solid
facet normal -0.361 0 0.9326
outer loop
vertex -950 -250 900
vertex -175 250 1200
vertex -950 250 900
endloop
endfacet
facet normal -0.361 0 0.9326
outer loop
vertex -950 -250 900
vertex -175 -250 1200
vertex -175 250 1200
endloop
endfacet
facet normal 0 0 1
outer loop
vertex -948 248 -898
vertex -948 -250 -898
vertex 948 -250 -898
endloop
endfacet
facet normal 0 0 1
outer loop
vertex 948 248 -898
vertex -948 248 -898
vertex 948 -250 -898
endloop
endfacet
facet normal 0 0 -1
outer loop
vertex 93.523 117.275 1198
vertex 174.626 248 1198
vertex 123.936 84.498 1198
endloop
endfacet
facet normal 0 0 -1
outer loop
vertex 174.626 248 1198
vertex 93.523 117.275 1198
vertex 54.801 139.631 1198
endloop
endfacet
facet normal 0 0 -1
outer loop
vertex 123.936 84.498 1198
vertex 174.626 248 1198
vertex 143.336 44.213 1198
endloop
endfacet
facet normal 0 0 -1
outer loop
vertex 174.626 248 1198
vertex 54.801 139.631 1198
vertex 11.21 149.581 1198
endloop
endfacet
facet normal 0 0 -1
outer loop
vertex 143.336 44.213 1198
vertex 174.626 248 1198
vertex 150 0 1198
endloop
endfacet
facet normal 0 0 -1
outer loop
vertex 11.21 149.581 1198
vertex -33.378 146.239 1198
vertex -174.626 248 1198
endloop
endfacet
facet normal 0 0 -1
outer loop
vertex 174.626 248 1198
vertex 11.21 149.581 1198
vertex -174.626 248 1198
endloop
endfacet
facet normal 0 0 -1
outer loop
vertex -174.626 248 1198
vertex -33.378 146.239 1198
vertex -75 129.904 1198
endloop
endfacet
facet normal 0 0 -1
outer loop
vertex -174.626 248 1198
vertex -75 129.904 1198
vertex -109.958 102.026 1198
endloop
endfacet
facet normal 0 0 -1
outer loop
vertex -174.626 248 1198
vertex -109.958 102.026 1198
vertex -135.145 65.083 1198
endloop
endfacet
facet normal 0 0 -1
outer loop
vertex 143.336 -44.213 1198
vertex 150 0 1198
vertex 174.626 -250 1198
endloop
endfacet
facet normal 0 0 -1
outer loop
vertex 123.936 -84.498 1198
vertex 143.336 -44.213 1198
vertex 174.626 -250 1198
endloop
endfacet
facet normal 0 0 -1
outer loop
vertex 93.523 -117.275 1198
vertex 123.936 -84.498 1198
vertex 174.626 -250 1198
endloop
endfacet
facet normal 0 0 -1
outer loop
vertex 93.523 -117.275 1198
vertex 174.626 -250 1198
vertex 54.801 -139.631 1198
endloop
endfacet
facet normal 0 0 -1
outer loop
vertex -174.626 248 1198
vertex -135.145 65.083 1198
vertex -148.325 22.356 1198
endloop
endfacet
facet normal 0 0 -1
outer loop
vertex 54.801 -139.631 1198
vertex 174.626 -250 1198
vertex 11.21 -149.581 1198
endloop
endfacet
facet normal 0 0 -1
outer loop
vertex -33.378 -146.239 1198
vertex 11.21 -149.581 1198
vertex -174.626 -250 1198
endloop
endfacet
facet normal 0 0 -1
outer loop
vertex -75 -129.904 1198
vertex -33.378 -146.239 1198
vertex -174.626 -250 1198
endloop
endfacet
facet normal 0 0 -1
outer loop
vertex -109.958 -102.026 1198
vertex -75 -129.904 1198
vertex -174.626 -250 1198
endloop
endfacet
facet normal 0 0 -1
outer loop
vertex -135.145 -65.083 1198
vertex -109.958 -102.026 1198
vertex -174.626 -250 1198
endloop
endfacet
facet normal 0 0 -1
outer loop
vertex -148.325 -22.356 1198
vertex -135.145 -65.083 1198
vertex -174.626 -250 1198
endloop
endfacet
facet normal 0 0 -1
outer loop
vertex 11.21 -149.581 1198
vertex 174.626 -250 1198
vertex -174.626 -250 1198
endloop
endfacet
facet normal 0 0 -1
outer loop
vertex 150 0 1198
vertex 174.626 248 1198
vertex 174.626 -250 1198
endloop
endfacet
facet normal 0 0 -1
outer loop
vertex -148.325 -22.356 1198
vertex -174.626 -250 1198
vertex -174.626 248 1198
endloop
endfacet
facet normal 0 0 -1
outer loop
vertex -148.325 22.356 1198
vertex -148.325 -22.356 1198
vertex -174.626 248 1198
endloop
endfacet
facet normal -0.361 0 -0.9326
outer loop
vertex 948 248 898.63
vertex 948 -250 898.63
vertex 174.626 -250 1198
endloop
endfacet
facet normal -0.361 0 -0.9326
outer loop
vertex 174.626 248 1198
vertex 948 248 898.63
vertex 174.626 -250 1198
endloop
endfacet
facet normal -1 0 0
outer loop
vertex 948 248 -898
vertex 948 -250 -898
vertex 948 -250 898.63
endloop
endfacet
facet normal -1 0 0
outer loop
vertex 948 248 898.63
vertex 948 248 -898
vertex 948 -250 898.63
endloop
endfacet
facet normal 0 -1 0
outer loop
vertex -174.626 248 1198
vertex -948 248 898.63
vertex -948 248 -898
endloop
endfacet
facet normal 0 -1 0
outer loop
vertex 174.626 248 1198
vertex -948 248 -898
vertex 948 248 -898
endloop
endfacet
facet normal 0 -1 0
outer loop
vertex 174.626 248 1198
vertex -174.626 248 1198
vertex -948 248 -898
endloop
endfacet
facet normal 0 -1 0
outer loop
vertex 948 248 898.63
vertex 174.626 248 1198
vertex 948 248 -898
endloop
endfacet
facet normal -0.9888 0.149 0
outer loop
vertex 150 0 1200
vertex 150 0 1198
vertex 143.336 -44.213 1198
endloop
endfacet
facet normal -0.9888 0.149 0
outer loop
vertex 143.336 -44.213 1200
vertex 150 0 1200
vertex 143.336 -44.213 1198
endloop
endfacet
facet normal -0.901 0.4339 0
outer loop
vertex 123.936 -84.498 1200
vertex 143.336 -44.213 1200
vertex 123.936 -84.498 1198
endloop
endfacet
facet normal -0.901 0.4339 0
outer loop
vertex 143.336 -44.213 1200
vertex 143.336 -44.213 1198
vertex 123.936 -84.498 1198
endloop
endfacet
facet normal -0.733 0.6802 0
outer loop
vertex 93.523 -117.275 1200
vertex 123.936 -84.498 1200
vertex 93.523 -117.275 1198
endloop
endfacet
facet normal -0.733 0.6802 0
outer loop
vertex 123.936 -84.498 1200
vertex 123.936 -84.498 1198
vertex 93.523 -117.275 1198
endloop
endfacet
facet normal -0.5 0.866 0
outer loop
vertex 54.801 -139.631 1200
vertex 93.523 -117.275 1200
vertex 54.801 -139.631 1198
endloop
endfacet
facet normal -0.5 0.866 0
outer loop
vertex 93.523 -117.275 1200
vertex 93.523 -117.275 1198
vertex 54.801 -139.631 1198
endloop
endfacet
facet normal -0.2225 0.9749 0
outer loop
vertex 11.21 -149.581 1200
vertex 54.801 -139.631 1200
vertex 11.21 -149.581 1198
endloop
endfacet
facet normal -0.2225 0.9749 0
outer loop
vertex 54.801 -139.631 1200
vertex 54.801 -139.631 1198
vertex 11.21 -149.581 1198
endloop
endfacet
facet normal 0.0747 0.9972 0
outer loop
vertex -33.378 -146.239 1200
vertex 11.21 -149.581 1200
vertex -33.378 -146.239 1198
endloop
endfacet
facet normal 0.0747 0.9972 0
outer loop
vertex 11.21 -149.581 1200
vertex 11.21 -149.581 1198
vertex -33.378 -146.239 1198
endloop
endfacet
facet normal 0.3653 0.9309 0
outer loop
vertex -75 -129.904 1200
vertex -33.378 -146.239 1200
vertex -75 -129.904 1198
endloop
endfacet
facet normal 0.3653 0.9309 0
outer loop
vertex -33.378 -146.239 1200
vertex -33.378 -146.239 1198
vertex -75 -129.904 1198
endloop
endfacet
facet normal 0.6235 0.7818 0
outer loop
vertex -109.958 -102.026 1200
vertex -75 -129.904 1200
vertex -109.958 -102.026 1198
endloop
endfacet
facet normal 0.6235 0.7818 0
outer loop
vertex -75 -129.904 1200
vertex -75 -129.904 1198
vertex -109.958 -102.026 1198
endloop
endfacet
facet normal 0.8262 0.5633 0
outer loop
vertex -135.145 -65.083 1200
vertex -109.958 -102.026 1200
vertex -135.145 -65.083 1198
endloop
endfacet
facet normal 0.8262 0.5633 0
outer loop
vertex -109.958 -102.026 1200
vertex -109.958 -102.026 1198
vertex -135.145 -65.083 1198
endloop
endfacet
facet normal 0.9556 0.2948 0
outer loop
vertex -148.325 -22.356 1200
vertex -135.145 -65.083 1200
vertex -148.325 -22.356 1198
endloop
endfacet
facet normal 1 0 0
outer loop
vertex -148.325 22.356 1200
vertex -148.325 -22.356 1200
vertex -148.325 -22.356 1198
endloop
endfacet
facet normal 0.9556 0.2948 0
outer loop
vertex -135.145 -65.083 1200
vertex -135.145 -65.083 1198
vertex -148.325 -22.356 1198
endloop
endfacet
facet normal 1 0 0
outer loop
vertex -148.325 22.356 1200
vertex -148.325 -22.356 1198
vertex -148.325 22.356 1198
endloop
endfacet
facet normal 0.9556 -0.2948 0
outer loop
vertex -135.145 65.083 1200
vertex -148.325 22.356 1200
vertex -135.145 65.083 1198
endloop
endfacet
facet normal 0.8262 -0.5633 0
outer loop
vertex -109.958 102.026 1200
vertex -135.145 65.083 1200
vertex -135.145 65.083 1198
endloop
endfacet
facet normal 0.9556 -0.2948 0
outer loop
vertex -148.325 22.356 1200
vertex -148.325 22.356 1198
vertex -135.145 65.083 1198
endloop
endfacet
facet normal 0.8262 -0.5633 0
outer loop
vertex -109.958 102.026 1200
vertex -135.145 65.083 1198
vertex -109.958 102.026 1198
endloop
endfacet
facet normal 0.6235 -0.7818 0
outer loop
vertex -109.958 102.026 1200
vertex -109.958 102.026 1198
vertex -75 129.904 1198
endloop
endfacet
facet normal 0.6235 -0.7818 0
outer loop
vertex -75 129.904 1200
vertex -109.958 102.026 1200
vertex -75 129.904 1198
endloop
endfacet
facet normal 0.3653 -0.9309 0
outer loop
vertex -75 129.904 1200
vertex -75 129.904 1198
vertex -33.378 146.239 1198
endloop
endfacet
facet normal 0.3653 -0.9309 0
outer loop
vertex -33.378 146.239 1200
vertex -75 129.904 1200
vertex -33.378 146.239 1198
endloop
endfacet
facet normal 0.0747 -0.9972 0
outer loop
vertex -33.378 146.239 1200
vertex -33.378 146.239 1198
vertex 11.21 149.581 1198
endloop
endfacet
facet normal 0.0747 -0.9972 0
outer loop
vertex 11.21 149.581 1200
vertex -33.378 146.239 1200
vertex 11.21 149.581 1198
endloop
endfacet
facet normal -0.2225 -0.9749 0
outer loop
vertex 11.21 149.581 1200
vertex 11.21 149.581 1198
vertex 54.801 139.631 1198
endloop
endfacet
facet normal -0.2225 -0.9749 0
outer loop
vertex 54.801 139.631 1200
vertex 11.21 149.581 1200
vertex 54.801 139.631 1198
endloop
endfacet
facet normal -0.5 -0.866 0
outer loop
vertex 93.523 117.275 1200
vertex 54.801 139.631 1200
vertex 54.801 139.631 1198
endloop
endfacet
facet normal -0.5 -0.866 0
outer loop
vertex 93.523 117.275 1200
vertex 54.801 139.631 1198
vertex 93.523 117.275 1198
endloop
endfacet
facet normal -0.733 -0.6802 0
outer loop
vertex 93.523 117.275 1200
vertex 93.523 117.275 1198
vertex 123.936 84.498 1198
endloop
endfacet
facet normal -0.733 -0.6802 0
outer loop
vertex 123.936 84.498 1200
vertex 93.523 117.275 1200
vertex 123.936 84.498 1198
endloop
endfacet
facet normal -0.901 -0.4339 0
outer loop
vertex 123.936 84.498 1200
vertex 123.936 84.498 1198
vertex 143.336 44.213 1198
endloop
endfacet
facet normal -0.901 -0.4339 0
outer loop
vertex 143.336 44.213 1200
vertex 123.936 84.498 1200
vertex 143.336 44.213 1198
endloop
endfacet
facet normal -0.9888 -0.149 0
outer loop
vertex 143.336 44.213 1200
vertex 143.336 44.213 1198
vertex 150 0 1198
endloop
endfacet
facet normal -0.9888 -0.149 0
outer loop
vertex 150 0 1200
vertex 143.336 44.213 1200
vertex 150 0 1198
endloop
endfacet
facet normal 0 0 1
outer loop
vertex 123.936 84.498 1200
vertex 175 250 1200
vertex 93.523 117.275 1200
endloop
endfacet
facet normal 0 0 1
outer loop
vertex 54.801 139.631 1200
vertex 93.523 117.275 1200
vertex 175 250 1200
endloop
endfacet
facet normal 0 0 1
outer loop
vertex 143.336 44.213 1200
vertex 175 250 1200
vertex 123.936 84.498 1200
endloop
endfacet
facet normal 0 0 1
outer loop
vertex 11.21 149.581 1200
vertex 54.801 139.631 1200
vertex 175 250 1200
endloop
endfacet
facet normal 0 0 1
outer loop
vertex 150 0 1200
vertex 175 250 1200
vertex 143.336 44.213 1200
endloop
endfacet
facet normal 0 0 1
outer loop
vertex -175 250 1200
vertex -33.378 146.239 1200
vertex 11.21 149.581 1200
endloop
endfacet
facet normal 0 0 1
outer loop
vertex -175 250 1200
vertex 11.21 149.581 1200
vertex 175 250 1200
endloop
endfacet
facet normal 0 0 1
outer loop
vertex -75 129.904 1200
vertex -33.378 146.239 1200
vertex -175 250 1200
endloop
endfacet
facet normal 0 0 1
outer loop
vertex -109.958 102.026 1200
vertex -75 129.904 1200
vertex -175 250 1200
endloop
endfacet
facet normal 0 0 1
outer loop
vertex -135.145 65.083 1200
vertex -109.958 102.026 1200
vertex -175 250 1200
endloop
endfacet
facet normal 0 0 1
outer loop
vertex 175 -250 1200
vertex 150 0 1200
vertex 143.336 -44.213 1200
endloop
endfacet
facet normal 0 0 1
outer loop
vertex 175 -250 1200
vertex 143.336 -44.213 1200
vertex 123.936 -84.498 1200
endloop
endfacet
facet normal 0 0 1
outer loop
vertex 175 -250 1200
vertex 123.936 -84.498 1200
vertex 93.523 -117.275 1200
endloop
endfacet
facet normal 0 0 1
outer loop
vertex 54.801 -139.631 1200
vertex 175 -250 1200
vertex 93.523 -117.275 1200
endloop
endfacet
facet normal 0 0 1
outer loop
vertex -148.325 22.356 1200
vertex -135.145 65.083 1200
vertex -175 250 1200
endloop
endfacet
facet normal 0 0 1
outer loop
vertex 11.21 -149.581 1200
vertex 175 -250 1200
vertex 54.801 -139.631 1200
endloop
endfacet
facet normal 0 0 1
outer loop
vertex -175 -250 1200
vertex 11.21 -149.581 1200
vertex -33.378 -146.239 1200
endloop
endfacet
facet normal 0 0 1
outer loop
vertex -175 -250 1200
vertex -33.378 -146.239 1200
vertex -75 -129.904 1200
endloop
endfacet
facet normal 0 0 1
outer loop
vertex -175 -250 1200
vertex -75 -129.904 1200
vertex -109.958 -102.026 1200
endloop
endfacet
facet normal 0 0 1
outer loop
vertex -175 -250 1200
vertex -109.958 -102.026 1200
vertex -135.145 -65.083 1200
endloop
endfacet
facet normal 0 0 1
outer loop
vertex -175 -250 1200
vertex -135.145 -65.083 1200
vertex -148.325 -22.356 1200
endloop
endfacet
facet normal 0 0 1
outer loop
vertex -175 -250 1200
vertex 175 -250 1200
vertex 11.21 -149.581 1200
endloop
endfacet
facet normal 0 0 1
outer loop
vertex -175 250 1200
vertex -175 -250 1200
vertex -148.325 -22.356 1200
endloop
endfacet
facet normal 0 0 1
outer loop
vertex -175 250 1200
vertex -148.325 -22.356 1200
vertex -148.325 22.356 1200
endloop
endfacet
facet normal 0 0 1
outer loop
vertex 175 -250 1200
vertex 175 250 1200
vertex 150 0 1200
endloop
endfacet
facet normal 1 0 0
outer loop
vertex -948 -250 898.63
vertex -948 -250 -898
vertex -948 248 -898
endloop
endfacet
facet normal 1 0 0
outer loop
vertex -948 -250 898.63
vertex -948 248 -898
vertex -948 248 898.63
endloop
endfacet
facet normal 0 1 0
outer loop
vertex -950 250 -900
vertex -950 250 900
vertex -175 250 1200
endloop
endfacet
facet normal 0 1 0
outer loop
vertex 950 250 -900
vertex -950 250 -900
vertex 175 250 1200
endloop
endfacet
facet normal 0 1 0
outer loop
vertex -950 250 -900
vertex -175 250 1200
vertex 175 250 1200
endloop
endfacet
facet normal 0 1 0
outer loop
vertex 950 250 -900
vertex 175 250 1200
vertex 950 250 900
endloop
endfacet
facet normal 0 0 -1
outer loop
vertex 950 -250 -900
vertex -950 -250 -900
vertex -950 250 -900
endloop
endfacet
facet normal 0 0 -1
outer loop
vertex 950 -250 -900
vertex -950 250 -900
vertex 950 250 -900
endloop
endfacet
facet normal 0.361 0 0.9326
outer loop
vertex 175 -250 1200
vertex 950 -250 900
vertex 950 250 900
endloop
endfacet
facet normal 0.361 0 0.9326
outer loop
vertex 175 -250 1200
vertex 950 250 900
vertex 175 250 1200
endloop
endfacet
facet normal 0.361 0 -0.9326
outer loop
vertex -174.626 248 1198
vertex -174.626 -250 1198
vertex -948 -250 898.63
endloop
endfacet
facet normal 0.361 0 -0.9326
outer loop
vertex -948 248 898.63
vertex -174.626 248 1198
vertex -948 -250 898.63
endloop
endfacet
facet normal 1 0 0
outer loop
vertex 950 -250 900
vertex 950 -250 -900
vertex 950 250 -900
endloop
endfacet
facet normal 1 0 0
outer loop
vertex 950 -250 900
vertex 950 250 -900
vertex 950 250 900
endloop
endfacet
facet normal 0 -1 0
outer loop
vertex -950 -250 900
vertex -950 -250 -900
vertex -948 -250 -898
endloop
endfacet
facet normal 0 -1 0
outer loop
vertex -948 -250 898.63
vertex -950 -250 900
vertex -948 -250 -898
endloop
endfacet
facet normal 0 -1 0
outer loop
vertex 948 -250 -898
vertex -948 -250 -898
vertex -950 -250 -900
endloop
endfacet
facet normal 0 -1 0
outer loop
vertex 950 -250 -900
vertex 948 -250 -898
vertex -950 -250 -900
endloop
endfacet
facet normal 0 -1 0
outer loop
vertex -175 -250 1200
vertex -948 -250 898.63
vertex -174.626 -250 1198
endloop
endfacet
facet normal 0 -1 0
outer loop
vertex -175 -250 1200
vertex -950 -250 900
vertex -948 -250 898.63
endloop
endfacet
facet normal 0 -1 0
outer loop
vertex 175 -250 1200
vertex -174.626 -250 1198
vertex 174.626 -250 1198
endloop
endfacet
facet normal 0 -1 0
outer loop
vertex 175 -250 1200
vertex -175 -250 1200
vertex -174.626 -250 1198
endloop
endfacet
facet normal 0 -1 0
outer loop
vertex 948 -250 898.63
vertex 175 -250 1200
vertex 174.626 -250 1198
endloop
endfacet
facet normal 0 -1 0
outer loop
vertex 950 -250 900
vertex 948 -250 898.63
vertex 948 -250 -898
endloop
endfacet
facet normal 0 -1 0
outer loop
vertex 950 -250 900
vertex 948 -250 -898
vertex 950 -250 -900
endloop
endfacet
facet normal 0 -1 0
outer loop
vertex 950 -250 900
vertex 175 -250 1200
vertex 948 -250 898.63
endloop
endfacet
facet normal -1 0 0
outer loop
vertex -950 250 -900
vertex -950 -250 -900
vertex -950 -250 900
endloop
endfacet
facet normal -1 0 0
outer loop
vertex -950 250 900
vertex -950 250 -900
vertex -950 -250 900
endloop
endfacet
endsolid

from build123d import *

# Parameters (mm, degrees)
F0_W     = 1900
F0_H     = 1800
F1_DEPTH = 250
F2_T     = -2
F4_D     = 300
F4_DEPTH = 1200.001


with BuildPart() as f1:
    # F0 (on Front) → F1 (new body, symmetric)
    with BuildSketch(Plane.XZ):
        Rectangle(F0_W, F0_H)
        Polygon((-950, 900), (950, 900), (175, 1200), (0, 1200), (-175, 1200), align=None)
    extrude(amount=F1_DEPTH, both=True)

    # F2
    f2_openings = [f1.faces().sort_by_distance(p)[0] for p in [
        (0, -250, 91.217565),
    ]]
    offset(amount=F2_T, openings=f2_openings)

    # F4 (through all, one way)
    with BuildSketch(Plane(origin=(0, 0, 0), x_dir=(1, 0, 0), z_dir=(0, 0, -1))):
        with Locations((0, 0)):
            Circle(F4_D / 2)
    extrude(amount=-F4_DEPTH, mode=Mode.SUBTRACT)


solid = f1.part
